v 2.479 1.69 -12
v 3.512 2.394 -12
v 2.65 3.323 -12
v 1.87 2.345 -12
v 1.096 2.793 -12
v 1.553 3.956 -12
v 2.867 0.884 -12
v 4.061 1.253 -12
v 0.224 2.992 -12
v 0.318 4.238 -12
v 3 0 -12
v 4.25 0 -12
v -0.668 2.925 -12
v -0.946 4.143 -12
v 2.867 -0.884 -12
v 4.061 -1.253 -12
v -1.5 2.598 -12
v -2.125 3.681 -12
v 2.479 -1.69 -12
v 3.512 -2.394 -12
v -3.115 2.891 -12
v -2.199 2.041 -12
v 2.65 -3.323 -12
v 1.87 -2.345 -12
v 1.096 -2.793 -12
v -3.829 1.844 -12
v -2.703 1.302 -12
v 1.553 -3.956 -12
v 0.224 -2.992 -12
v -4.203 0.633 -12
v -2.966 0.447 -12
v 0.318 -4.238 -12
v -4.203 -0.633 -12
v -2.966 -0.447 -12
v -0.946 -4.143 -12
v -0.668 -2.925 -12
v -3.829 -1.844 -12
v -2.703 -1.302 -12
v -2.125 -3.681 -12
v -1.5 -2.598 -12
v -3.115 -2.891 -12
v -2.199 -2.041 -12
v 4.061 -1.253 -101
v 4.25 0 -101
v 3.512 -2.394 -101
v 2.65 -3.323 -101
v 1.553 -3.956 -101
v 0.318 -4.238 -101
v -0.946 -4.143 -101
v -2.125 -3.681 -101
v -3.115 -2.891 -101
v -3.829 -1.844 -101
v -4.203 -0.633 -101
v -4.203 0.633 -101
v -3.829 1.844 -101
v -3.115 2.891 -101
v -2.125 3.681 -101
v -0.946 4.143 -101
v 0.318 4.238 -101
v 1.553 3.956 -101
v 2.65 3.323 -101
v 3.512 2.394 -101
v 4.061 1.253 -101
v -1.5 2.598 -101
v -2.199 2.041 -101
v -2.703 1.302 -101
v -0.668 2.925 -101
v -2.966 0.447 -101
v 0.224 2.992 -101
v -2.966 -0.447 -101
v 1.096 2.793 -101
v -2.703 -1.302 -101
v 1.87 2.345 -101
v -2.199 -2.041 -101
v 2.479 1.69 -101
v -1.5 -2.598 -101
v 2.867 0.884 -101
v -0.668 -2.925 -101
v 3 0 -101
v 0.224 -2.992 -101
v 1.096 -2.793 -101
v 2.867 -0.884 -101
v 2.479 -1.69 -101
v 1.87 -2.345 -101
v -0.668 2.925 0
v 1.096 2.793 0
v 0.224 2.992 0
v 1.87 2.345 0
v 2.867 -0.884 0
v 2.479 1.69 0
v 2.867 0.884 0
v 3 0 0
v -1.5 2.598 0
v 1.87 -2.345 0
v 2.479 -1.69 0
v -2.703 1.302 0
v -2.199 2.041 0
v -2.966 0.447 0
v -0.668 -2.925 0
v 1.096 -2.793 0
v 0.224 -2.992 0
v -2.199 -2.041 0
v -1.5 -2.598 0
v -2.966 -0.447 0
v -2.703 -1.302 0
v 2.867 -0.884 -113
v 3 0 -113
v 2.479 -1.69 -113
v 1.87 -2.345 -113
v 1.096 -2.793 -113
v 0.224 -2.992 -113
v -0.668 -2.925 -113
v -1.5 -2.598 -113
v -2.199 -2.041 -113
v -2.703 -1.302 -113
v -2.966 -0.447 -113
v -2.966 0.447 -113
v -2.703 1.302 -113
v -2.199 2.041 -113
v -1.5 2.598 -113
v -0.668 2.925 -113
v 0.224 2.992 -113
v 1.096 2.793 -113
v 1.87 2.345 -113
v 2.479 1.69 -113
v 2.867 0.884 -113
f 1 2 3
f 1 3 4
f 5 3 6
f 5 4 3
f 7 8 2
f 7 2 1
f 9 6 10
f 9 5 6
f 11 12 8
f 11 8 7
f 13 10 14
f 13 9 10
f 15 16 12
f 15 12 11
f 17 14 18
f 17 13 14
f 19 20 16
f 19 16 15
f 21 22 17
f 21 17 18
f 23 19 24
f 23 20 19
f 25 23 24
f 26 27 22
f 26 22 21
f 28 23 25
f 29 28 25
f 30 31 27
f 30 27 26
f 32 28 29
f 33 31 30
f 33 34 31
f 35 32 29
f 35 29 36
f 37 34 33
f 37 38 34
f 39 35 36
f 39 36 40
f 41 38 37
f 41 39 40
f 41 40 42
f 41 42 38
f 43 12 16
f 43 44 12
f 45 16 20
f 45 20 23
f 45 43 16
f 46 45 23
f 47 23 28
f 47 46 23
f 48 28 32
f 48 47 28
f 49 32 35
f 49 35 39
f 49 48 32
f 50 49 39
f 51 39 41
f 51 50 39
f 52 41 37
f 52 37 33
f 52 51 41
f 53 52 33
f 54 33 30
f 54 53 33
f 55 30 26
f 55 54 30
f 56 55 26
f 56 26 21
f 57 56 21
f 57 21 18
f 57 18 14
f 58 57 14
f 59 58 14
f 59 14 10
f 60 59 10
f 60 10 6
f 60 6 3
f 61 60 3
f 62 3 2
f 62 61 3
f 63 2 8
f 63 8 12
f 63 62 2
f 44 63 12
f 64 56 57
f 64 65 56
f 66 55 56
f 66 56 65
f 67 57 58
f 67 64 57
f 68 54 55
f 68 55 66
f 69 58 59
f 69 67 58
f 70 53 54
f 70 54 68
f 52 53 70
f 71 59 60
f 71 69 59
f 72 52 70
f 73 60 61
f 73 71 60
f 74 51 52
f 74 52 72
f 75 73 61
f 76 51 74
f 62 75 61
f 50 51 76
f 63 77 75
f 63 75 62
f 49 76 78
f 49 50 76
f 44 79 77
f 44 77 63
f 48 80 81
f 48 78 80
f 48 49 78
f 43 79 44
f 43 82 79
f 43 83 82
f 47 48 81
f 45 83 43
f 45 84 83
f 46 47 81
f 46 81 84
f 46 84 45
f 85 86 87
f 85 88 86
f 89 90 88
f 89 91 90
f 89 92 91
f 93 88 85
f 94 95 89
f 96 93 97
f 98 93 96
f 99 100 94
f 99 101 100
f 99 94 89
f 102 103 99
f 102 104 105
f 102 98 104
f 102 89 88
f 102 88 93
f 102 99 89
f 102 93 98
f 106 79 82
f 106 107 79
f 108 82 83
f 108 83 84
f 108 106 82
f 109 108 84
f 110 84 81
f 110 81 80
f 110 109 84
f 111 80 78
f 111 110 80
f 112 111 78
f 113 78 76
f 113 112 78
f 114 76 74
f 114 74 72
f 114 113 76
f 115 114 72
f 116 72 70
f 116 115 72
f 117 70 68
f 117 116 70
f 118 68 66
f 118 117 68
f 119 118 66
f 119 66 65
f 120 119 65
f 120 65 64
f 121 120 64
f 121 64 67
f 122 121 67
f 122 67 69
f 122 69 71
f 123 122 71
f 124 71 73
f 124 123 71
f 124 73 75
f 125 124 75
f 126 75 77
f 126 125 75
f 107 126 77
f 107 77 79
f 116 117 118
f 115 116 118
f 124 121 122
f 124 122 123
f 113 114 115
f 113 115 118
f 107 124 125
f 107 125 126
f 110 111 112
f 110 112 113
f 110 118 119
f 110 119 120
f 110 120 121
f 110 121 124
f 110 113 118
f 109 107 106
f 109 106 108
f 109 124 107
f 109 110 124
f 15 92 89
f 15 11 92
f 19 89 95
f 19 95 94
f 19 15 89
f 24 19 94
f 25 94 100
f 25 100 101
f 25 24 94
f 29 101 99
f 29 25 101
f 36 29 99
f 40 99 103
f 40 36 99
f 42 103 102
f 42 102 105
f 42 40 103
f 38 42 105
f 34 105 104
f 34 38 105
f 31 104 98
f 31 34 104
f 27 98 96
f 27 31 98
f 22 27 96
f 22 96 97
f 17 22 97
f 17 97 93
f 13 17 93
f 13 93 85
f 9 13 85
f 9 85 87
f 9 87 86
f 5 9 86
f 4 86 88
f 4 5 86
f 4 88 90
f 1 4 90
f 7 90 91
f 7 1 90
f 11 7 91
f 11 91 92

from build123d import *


with BuildPart() as part:
    # Sketch1 → Revolve2 (revolve)
    with BuildSketch(Plane(origin=(0, 0, 0), x_dir=(0, 0, -1), z_dir=(1, 0, 0)), mode=Mode.PRIVATE) as revolve2_sk:
        Polygon((0, 0), (0, 3), (12, 3), (12, 4.25), (101, 4.25), (101, 3), (113, 3), (113, 0), align=None)
    revolve(revolve2_sk.sketch.rotate(Axis((0, 0, 0), (0, 0, -1)), 90), axis=Axis((0, 0, 0), (0, 0, -1)))


solid = part.part
